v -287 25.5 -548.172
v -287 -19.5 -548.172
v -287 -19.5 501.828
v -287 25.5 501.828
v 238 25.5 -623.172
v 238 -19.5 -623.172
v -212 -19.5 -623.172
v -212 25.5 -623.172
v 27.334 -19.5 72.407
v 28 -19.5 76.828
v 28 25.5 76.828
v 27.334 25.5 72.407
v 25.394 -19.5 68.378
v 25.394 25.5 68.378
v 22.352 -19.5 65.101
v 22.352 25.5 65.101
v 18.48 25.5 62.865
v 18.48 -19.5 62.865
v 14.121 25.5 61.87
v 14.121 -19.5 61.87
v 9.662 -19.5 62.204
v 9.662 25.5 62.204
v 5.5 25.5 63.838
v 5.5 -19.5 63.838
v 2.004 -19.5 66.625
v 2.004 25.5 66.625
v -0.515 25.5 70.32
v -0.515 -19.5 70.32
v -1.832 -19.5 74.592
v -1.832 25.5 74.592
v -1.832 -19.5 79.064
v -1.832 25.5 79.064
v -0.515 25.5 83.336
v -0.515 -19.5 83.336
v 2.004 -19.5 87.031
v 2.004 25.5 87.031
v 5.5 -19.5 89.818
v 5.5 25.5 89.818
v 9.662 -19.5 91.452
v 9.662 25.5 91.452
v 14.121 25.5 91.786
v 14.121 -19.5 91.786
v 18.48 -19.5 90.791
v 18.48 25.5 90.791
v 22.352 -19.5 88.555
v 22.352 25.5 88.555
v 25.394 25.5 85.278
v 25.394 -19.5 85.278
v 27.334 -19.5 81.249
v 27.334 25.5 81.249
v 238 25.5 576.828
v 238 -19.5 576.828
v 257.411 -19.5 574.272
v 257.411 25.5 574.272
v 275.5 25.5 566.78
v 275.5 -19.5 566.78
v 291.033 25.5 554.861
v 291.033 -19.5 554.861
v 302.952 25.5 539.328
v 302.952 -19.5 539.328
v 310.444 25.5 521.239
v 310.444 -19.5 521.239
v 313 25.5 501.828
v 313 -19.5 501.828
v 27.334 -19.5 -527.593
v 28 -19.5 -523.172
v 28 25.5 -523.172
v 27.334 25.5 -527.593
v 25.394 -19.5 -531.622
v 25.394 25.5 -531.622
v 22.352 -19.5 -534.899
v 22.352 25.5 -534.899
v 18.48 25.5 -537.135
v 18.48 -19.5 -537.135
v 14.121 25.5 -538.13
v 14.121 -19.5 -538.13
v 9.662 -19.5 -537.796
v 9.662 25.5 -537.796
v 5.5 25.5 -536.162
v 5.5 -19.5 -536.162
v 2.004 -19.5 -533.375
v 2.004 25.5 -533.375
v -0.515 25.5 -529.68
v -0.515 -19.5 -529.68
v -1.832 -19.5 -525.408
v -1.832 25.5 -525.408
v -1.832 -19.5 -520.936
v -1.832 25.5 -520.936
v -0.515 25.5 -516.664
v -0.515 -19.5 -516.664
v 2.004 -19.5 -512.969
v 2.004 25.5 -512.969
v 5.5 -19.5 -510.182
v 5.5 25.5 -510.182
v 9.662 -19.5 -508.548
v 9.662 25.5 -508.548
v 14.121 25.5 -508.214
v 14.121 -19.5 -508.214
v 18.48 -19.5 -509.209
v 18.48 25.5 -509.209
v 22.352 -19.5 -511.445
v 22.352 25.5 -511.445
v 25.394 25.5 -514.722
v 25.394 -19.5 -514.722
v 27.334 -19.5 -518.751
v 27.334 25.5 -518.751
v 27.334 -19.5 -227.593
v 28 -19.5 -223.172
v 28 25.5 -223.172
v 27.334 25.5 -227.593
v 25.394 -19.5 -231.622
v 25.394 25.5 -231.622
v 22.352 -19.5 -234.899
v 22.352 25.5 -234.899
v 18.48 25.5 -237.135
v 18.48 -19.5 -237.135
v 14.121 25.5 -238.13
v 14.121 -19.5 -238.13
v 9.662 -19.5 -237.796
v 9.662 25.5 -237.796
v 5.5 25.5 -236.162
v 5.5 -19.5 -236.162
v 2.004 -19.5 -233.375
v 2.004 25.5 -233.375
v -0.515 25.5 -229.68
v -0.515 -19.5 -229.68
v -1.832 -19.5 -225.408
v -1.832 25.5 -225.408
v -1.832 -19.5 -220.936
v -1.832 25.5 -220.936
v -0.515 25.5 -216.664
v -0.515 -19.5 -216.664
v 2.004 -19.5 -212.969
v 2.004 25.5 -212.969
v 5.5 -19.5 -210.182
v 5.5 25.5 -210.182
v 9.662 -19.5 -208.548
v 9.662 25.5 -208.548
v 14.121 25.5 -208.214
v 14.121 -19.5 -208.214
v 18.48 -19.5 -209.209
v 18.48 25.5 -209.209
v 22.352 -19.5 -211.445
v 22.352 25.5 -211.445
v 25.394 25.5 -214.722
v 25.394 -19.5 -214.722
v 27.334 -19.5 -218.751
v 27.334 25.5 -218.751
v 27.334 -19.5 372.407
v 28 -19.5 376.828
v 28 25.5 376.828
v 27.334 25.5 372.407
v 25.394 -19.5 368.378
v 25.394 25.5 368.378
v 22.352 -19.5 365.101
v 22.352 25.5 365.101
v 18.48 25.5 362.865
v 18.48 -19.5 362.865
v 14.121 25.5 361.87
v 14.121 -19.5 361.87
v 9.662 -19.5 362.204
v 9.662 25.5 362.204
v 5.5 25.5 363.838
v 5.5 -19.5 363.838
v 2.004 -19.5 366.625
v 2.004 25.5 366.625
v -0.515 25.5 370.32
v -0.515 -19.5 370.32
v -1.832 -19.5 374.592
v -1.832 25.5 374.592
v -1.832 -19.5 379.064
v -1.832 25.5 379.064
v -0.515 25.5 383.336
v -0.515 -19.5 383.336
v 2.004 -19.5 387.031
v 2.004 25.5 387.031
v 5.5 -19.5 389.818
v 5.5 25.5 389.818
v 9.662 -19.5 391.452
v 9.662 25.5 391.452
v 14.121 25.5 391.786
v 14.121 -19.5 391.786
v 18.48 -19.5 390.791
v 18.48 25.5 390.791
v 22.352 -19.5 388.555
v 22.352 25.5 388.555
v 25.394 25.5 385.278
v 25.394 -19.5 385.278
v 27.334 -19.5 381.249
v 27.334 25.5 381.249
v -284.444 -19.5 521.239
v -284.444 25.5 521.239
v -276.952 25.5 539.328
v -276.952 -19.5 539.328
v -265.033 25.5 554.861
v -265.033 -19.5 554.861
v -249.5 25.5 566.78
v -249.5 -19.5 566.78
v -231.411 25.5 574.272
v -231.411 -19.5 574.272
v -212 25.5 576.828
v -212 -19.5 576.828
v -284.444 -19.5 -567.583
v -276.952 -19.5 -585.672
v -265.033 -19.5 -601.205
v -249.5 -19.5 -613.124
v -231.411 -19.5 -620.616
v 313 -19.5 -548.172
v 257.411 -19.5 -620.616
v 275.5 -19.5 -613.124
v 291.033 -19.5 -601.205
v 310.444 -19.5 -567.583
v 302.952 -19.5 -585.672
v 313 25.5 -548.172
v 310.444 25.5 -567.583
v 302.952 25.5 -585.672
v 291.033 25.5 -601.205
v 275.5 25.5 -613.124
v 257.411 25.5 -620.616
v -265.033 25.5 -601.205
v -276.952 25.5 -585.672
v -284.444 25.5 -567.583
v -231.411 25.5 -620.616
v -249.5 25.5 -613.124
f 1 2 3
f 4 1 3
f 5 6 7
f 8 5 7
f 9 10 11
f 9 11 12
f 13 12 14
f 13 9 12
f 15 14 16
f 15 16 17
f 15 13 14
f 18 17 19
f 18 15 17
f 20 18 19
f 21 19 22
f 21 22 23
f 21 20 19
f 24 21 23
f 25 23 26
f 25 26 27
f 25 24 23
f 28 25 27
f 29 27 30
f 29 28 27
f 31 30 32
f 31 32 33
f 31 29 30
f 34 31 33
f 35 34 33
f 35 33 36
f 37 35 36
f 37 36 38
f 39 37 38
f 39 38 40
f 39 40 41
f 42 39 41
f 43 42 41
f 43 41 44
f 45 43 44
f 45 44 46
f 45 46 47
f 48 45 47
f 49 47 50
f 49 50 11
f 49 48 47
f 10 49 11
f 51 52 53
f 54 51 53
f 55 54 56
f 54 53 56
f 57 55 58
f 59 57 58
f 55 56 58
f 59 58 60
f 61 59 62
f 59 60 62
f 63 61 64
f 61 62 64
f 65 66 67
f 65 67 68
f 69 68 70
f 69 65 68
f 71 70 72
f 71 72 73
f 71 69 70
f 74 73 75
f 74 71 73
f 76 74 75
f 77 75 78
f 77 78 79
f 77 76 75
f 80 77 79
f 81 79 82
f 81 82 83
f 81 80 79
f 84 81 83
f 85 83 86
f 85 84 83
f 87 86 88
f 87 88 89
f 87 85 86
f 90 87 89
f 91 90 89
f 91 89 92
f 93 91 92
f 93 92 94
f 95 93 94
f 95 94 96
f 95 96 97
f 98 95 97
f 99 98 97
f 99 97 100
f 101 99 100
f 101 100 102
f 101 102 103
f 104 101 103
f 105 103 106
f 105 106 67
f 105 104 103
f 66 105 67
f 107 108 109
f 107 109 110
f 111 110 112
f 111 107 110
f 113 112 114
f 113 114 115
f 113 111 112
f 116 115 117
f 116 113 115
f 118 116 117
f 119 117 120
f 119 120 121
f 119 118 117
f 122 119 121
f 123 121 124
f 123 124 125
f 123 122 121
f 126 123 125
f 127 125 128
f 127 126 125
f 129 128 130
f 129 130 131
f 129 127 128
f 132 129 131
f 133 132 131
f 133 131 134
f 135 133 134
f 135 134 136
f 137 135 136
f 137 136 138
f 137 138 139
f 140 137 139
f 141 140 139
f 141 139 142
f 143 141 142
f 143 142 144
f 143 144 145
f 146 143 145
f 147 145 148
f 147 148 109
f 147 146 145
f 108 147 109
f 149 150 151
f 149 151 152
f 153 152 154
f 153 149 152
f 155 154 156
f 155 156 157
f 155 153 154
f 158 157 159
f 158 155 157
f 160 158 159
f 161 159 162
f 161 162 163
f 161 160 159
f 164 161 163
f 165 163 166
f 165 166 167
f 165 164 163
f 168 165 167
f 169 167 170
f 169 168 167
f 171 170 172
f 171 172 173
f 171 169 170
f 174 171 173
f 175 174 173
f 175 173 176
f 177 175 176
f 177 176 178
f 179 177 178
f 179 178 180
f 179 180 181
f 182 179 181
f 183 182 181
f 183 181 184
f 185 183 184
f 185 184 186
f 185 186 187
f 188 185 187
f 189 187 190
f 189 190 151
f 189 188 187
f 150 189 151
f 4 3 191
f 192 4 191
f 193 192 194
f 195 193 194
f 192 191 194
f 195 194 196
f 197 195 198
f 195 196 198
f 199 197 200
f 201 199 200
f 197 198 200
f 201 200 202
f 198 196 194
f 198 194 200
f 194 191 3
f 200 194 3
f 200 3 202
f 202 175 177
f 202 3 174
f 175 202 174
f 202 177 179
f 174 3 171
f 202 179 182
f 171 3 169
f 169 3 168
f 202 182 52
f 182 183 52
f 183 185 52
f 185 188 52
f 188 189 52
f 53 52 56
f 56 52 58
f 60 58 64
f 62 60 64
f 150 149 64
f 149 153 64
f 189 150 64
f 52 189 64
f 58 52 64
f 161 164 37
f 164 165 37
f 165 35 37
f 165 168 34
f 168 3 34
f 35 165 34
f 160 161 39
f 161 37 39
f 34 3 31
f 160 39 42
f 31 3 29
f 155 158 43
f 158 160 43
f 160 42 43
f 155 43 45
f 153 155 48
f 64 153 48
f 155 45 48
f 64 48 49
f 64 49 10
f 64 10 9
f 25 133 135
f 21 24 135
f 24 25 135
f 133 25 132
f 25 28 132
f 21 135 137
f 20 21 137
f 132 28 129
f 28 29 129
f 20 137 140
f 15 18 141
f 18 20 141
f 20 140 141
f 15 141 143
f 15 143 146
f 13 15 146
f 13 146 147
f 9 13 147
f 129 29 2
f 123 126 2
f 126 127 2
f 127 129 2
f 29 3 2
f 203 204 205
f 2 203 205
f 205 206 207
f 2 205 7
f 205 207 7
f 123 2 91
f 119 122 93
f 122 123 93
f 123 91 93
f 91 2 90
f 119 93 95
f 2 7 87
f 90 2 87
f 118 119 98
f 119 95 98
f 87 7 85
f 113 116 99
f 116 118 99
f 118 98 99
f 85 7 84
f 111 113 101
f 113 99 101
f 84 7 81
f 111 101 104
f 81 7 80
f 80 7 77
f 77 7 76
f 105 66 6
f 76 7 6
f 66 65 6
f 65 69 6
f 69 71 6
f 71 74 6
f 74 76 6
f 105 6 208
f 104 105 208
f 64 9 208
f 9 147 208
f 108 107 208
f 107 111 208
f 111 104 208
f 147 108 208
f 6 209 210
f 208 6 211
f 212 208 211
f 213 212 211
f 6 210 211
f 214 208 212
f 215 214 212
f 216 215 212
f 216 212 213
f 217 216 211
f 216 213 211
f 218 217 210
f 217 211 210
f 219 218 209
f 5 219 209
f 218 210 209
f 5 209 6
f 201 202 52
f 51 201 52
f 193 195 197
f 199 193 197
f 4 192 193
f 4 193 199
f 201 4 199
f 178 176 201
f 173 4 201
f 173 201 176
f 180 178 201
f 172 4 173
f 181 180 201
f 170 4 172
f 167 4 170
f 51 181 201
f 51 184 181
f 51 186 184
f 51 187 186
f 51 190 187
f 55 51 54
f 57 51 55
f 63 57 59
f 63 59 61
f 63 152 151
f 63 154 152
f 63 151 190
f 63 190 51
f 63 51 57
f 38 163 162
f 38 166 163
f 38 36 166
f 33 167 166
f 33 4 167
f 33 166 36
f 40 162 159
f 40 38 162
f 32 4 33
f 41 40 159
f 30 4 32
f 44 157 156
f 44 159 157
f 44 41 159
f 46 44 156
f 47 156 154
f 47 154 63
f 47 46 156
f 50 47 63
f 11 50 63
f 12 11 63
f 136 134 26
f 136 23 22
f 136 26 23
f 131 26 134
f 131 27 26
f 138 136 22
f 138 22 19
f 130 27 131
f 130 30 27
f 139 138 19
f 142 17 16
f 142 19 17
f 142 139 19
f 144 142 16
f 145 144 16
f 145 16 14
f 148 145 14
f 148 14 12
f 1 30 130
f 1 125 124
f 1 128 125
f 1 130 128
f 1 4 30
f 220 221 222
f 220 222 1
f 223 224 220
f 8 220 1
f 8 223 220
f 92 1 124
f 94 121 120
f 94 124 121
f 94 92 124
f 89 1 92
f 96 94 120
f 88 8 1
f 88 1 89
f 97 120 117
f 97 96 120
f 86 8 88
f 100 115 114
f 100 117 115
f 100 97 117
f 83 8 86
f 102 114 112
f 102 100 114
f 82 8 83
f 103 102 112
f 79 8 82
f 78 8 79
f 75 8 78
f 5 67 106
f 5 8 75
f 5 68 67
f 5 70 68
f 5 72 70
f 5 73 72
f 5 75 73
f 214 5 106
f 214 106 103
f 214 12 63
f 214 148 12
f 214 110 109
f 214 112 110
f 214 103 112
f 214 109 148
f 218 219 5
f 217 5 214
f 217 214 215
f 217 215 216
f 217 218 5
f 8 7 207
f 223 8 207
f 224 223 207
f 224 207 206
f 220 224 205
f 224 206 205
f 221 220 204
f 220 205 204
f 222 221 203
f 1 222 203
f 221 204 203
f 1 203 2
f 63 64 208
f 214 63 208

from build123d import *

# Parameters (mm, degrees)
SKETCH1_R           = 2
BOSS_EXTRUDE1_DEPTH = 6
SCALE1_SCALE        = 7.5


with BuildPart() as part:
    # Sketch1 → Boss-Extrude1 (new body)
    with BuildSketch(Plane(origin=(0, 0, 0), x_dir=(1, 0, 0), z_dir=(0, 1, 0))):
        with BuildLine():
            Line((-27, -27), (-27, -47))
            ThreePointArc((-27, -47), (-24.071067812, -54.071067812), (-17, -57))
            Line((-17, -57), (43, -57))
            ThreePointArc((43, -57), (50.071067812, -54.071067812), (53, -47))
            Line((53, -47), (53, -27))
            Line((53, -27), (53, 93))
            ThreePointArc((53, 93), (50.071067812, 100.071067812), (43, 103))
            Line((43, 103), (-17, 103))
            ThreePointArc((-17, 103), (-24.071067812, 100.071067812), (-27, 93))
            Line((-27, 93), (-27, -27))
        make_face()
        with Locations((13, 89.666666667)):
            Circle(SKETCH1_R, mode=Mode.SUBTRACT)
        with Locations((13, 49.666666667)):
            Circle(SKETCH1_R, mode=Mode.SUBTRACT)
        with Locations((13, 9.666666667)):
            Circle(SKETCH1_R, mode=Mode.SUBTRACT)
        with Locations((13, -30.333333333)):
            Circle(SKETCH1_R, mode=Mode.SUBTRACT)
    extrude(amount=BOSS_EXTRUDE1_DEPTH)


with BuildPart() as part_1:
    # Scale1: scaled about (13, 3, -22.97353869)
    add(part.part.scale(SCALE1_SCALE).moved(Location((-84.5, -19.5, 149.328001485))))


solid = part_1.part
